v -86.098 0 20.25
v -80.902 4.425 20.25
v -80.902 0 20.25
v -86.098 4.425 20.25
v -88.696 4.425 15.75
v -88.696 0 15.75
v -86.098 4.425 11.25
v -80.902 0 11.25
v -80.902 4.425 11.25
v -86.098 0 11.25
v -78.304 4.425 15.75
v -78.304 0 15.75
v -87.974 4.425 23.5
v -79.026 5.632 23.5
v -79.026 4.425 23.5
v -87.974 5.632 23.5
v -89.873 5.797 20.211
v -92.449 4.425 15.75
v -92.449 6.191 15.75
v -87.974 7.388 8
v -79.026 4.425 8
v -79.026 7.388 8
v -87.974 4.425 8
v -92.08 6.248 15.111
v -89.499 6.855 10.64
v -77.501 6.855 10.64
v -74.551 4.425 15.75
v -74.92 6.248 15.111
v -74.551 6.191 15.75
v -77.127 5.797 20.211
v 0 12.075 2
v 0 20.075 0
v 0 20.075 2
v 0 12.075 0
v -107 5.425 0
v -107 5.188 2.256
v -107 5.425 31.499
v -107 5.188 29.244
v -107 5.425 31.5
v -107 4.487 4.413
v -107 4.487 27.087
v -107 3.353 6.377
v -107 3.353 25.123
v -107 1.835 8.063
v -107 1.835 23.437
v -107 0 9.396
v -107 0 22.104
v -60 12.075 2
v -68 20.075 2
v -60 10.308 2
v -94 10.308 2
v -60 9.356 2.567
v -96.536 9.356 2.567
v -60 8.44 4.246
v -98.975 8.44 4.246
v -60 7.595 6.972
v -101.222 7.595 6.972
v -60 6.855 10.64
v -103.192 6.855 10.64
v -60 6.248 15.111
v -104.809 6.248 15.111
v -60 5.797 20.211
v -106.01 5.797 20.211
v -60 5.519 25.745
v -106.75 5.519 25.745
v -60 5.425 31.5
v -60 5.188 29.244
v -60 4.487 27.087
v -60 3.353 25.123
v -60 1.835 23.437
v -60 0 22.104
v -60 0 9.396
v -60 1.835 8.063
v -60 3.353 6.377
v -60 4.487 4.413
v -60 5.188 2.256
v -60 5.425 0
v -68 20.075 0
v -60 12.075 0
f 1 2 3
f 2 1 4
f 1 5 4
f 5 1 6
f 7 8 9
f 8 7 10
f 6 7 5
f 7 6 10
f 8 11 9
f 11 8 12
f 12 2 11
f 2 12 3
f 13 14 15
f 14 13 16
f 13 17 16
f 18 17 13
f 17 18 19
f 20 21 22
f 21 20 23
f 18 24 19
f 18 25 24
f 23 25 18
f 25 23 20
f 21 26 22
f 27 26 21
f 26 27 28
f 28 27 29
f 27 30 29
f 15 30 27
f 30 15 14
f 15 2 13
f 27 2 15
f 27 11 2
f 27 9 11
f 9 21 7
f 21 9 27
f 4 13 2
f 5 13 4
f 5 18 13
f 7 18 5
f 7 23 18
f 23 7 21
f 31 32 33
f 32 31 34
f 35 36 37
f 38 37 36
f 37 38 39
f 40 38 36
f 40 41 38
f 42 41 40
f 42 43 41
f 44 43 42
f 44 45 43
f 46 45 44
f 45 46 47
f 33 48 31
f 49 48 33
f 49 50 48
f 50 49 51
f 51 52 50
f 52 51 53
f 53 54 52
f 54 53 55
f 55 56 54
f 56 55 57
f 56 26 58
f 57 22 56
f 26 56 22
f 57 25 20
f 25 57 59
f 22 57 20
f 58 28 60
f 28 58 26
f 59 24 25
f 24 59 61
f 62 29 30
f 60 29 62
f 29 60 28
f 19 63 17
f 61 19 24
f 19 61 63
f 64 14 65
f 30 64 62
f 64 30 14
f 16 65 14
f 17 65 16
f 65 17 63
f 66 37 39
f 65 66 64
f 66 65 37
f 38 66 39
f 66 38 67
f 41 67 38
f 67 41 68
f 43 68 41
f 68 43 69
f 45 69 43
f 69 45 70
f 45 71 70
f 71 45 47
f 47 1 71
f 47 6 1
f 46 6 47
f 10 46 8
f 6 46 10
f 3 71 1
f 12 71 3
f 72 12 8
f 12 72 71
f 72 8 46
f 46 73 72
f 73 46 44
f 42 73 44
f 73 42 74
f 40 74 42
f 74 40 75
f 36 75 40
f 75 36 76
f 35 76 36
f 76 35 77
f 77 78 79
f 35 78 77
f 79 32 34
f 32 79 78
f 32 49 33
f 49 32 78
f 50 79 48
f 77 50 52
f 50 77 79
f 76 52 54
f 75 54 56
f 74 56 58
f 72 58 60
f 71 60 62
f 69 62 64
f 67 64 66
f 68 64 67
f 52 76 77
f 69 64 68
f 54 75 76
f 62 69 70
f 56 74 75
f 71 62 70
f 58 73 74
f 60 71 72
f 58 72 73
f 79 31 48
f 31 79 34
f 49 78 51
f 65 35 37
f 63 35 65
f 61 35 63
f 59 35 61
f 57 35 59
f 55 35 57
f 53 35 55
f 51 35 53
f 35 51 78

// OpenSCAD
// file: settings.scad
rod_size = 9;
rod_nut_size = 15.5; //12 for M6, 15 for M8
bearing_size = 15.7; //12.5 for LM6UU, 15.5 for LM8UU,LM8SUU
bearing_length = 25.5; //19.5 for LM6UU, 17.5 for LM8SUU, 24.5 for LM8UU
yz_motor_distance = 25;
motor_screw_spacing = 31; //26 for NEMA14, 31 for NEMA17
motor_casing = 45; //38 for NEMA14, 45 for NEMA17
end_height = 55; //measure the height of your motor casing and add 4mm. Suggestion: 40 for NEMA14, 55 for NEMA17
bed_mount_height = 16;
//x_rod_spacing = motor_screw_spacing + 3 + rod_size;
x_rod_spacing = 30;
x_carriage_width = 70;
carriage_extruder_offset = 5;
pulley_size = 20;
idler_pulley_width = 10;
gusset_size = 15;
m3_size = 3.5;
m3_nut_size = 7;
// m3 nut height is because tristan doesn't know the height of an m3 nut, it is not implemented everywhere, just on the z stop in base_end_2off.scad
m3_nut_height = 3;
m4_size = 4.5;
motor_shaft_size = 5.5;

z_stop_screw_spacing = 20;
// these may be super unneeded, in which case we can easily do a search and replace. But they may be really useful for prototyping/whatever.
z_stop_mount_x_buffer = 2;
z_stop_mount_y_buffer = 2;
z_stop_mount_z_buffer = 2;
z_stop_side_holes = true;
z_stop_bottom_holes = false;

z_stop_arm_actuator_width = 2;
z_stop_arm_actuator_depth = 8;
z_stop_arm_actuator_height = 60;
z_stop_depth = -30;//this is for the optical endstop, this is the width from where it is mounted to where it is clear for the arm to go through.
z_stop_x_adjust=0;

// printer properties. These settings affect major changes in the structure of the printer.
use_rod_for_x_ends = true; // This makes the holes that clamp the x ends the size for rod. This is good when mounting the optical endstop arm, because it is hard to find bolts long enough to go through the end and the endstop arm. (metric ones at least)

// meta vars, these are set by other vars for ease of reference.
z_mount_width = m3_nut_size+z_stop_screw_spacing+(z_stop_mount_x_buffer*2);
base_z_rod_x_offset = yz_motor_distance / 2 - rod_size;
distance_between_x_end_cylinders = motor_casing / 2 + rod_size;
z_stop_x_offset = base_z_rod_x_offset + distance_between_x_end_cylinders - (z_mount_width/2) + z_stop_x_adjust;
x_end_cylinder_radius = bearing_size / 2 + 3;
x_end_front_face_y_offset = (bearing_size / 2 + 3)/2;//In case it's non obvious, this is for getting the amount the x end cylinders extend past the front face.
x_end_cylinder_protrution_depth = x_end_cylinder_radius - x_end_front_face_y_offset;
z_stop_arm_depth = z_stop_arm_actuator_depth + z_stop_depth + m3_nut_height+(z_stop_mount_y_buffer*2)+(motor_casing + (rod_size*4))/2 - x_end_front_face_y_offset;
z_stop_arm_height = z_stop_arm_actuator_height + x_rod_spacing + 8 + rod_size;
z_stop_arm_x_support_depth = (z_stop_arm_depth - x_end_cylinder_protrution_depth) / 3;

// ratio for converting diameter to apothem
da6 = 1 / cos(180 / 6) / 2;
da8 = 1 / cos(180 / 8) / 2;
// main file
include <settings.scad>;

mirror([1,0,0])
z_stop_arm();

module z_stop_arm() difference() {
    union(){
        rotate([90,0,90]) linear_extrude(height = z_stop_arm_height,convexity=5) difference() {
            union(){
                square([x_end_cylinder_protrution_depth + z_stop_arm_x_support_depth, distance_between_x_end_cylinders]);
                translate([x_end_cylinder_protrution_depth + z_stop_arm_x_support_depth,0,0]) square([z_stop_arm_depth-z_stop_arm_x_support_depth-x_end_cylinder_protrution_depth, z_stop_arm_actuator_width]);
            }
            // differences for basic form
            translate([x_end_cylinder_protrution_depth+z_stop_arm_x_support_depth, distance_between_x_end_cylinders]) resize([(z_stop_arm_x_support_depth)*2,(distance_between_x_end_cylinders-z_stop_arm_actuator_width)*2]) circle($fn=32);
            for (ii = [0,1]){
                translate([-x_end_front_face_y_offset, ii*distance_between_x_end_cylinders,0]) circle(x_end_cylinder_radius);
            }
        }
    }
    //differences for basic form
    cube([z_stop_arm_actuator_height, z_stop_arm_depth-z_stop_arm_actuator_depth, distance_between_x_end_cylinders]);
    translate([z_stop_arm_height,z_stop_arm_depth,0]) resize([2*(z_stop_arm_height-z_stop_arm_actuator_height-z_stop_arm_actuator_depth), 2*(z_stop_arm_depth-x_end_cylinder_protrution_depth),distance_between_x_end_cylinders]) cylinder($fn=4);
    // Holes for the bolt affixing.
    translate([z_stop_arm_height-(z_stop_arm_height-z_stop_arm_actuator_height)/2,-1,distance_between_x_end_cylinders/2])
		rotate([-90, 0, 0]) {
            if (use_rod_for_x_ends) {
			    cylinder(r = rod_size * da6, h = 101, center = false, $fn = 6);
                translate([0,0,x_end_cylinder_protrution_depth]) cylinder(r=rod_nut_size*da6,h=z_stop_arm_x_support_depth,$fn=6);
            } else {
                translate([0,0,x_end_cylinder_protrution_depth]) cylinder(r = m3_nut_size * da6, h = 100, center = false, $fn = 6);
                cylinder(r = m3_size * da6, h = 100, center = false, $fn = 6);
            }
		}
}
